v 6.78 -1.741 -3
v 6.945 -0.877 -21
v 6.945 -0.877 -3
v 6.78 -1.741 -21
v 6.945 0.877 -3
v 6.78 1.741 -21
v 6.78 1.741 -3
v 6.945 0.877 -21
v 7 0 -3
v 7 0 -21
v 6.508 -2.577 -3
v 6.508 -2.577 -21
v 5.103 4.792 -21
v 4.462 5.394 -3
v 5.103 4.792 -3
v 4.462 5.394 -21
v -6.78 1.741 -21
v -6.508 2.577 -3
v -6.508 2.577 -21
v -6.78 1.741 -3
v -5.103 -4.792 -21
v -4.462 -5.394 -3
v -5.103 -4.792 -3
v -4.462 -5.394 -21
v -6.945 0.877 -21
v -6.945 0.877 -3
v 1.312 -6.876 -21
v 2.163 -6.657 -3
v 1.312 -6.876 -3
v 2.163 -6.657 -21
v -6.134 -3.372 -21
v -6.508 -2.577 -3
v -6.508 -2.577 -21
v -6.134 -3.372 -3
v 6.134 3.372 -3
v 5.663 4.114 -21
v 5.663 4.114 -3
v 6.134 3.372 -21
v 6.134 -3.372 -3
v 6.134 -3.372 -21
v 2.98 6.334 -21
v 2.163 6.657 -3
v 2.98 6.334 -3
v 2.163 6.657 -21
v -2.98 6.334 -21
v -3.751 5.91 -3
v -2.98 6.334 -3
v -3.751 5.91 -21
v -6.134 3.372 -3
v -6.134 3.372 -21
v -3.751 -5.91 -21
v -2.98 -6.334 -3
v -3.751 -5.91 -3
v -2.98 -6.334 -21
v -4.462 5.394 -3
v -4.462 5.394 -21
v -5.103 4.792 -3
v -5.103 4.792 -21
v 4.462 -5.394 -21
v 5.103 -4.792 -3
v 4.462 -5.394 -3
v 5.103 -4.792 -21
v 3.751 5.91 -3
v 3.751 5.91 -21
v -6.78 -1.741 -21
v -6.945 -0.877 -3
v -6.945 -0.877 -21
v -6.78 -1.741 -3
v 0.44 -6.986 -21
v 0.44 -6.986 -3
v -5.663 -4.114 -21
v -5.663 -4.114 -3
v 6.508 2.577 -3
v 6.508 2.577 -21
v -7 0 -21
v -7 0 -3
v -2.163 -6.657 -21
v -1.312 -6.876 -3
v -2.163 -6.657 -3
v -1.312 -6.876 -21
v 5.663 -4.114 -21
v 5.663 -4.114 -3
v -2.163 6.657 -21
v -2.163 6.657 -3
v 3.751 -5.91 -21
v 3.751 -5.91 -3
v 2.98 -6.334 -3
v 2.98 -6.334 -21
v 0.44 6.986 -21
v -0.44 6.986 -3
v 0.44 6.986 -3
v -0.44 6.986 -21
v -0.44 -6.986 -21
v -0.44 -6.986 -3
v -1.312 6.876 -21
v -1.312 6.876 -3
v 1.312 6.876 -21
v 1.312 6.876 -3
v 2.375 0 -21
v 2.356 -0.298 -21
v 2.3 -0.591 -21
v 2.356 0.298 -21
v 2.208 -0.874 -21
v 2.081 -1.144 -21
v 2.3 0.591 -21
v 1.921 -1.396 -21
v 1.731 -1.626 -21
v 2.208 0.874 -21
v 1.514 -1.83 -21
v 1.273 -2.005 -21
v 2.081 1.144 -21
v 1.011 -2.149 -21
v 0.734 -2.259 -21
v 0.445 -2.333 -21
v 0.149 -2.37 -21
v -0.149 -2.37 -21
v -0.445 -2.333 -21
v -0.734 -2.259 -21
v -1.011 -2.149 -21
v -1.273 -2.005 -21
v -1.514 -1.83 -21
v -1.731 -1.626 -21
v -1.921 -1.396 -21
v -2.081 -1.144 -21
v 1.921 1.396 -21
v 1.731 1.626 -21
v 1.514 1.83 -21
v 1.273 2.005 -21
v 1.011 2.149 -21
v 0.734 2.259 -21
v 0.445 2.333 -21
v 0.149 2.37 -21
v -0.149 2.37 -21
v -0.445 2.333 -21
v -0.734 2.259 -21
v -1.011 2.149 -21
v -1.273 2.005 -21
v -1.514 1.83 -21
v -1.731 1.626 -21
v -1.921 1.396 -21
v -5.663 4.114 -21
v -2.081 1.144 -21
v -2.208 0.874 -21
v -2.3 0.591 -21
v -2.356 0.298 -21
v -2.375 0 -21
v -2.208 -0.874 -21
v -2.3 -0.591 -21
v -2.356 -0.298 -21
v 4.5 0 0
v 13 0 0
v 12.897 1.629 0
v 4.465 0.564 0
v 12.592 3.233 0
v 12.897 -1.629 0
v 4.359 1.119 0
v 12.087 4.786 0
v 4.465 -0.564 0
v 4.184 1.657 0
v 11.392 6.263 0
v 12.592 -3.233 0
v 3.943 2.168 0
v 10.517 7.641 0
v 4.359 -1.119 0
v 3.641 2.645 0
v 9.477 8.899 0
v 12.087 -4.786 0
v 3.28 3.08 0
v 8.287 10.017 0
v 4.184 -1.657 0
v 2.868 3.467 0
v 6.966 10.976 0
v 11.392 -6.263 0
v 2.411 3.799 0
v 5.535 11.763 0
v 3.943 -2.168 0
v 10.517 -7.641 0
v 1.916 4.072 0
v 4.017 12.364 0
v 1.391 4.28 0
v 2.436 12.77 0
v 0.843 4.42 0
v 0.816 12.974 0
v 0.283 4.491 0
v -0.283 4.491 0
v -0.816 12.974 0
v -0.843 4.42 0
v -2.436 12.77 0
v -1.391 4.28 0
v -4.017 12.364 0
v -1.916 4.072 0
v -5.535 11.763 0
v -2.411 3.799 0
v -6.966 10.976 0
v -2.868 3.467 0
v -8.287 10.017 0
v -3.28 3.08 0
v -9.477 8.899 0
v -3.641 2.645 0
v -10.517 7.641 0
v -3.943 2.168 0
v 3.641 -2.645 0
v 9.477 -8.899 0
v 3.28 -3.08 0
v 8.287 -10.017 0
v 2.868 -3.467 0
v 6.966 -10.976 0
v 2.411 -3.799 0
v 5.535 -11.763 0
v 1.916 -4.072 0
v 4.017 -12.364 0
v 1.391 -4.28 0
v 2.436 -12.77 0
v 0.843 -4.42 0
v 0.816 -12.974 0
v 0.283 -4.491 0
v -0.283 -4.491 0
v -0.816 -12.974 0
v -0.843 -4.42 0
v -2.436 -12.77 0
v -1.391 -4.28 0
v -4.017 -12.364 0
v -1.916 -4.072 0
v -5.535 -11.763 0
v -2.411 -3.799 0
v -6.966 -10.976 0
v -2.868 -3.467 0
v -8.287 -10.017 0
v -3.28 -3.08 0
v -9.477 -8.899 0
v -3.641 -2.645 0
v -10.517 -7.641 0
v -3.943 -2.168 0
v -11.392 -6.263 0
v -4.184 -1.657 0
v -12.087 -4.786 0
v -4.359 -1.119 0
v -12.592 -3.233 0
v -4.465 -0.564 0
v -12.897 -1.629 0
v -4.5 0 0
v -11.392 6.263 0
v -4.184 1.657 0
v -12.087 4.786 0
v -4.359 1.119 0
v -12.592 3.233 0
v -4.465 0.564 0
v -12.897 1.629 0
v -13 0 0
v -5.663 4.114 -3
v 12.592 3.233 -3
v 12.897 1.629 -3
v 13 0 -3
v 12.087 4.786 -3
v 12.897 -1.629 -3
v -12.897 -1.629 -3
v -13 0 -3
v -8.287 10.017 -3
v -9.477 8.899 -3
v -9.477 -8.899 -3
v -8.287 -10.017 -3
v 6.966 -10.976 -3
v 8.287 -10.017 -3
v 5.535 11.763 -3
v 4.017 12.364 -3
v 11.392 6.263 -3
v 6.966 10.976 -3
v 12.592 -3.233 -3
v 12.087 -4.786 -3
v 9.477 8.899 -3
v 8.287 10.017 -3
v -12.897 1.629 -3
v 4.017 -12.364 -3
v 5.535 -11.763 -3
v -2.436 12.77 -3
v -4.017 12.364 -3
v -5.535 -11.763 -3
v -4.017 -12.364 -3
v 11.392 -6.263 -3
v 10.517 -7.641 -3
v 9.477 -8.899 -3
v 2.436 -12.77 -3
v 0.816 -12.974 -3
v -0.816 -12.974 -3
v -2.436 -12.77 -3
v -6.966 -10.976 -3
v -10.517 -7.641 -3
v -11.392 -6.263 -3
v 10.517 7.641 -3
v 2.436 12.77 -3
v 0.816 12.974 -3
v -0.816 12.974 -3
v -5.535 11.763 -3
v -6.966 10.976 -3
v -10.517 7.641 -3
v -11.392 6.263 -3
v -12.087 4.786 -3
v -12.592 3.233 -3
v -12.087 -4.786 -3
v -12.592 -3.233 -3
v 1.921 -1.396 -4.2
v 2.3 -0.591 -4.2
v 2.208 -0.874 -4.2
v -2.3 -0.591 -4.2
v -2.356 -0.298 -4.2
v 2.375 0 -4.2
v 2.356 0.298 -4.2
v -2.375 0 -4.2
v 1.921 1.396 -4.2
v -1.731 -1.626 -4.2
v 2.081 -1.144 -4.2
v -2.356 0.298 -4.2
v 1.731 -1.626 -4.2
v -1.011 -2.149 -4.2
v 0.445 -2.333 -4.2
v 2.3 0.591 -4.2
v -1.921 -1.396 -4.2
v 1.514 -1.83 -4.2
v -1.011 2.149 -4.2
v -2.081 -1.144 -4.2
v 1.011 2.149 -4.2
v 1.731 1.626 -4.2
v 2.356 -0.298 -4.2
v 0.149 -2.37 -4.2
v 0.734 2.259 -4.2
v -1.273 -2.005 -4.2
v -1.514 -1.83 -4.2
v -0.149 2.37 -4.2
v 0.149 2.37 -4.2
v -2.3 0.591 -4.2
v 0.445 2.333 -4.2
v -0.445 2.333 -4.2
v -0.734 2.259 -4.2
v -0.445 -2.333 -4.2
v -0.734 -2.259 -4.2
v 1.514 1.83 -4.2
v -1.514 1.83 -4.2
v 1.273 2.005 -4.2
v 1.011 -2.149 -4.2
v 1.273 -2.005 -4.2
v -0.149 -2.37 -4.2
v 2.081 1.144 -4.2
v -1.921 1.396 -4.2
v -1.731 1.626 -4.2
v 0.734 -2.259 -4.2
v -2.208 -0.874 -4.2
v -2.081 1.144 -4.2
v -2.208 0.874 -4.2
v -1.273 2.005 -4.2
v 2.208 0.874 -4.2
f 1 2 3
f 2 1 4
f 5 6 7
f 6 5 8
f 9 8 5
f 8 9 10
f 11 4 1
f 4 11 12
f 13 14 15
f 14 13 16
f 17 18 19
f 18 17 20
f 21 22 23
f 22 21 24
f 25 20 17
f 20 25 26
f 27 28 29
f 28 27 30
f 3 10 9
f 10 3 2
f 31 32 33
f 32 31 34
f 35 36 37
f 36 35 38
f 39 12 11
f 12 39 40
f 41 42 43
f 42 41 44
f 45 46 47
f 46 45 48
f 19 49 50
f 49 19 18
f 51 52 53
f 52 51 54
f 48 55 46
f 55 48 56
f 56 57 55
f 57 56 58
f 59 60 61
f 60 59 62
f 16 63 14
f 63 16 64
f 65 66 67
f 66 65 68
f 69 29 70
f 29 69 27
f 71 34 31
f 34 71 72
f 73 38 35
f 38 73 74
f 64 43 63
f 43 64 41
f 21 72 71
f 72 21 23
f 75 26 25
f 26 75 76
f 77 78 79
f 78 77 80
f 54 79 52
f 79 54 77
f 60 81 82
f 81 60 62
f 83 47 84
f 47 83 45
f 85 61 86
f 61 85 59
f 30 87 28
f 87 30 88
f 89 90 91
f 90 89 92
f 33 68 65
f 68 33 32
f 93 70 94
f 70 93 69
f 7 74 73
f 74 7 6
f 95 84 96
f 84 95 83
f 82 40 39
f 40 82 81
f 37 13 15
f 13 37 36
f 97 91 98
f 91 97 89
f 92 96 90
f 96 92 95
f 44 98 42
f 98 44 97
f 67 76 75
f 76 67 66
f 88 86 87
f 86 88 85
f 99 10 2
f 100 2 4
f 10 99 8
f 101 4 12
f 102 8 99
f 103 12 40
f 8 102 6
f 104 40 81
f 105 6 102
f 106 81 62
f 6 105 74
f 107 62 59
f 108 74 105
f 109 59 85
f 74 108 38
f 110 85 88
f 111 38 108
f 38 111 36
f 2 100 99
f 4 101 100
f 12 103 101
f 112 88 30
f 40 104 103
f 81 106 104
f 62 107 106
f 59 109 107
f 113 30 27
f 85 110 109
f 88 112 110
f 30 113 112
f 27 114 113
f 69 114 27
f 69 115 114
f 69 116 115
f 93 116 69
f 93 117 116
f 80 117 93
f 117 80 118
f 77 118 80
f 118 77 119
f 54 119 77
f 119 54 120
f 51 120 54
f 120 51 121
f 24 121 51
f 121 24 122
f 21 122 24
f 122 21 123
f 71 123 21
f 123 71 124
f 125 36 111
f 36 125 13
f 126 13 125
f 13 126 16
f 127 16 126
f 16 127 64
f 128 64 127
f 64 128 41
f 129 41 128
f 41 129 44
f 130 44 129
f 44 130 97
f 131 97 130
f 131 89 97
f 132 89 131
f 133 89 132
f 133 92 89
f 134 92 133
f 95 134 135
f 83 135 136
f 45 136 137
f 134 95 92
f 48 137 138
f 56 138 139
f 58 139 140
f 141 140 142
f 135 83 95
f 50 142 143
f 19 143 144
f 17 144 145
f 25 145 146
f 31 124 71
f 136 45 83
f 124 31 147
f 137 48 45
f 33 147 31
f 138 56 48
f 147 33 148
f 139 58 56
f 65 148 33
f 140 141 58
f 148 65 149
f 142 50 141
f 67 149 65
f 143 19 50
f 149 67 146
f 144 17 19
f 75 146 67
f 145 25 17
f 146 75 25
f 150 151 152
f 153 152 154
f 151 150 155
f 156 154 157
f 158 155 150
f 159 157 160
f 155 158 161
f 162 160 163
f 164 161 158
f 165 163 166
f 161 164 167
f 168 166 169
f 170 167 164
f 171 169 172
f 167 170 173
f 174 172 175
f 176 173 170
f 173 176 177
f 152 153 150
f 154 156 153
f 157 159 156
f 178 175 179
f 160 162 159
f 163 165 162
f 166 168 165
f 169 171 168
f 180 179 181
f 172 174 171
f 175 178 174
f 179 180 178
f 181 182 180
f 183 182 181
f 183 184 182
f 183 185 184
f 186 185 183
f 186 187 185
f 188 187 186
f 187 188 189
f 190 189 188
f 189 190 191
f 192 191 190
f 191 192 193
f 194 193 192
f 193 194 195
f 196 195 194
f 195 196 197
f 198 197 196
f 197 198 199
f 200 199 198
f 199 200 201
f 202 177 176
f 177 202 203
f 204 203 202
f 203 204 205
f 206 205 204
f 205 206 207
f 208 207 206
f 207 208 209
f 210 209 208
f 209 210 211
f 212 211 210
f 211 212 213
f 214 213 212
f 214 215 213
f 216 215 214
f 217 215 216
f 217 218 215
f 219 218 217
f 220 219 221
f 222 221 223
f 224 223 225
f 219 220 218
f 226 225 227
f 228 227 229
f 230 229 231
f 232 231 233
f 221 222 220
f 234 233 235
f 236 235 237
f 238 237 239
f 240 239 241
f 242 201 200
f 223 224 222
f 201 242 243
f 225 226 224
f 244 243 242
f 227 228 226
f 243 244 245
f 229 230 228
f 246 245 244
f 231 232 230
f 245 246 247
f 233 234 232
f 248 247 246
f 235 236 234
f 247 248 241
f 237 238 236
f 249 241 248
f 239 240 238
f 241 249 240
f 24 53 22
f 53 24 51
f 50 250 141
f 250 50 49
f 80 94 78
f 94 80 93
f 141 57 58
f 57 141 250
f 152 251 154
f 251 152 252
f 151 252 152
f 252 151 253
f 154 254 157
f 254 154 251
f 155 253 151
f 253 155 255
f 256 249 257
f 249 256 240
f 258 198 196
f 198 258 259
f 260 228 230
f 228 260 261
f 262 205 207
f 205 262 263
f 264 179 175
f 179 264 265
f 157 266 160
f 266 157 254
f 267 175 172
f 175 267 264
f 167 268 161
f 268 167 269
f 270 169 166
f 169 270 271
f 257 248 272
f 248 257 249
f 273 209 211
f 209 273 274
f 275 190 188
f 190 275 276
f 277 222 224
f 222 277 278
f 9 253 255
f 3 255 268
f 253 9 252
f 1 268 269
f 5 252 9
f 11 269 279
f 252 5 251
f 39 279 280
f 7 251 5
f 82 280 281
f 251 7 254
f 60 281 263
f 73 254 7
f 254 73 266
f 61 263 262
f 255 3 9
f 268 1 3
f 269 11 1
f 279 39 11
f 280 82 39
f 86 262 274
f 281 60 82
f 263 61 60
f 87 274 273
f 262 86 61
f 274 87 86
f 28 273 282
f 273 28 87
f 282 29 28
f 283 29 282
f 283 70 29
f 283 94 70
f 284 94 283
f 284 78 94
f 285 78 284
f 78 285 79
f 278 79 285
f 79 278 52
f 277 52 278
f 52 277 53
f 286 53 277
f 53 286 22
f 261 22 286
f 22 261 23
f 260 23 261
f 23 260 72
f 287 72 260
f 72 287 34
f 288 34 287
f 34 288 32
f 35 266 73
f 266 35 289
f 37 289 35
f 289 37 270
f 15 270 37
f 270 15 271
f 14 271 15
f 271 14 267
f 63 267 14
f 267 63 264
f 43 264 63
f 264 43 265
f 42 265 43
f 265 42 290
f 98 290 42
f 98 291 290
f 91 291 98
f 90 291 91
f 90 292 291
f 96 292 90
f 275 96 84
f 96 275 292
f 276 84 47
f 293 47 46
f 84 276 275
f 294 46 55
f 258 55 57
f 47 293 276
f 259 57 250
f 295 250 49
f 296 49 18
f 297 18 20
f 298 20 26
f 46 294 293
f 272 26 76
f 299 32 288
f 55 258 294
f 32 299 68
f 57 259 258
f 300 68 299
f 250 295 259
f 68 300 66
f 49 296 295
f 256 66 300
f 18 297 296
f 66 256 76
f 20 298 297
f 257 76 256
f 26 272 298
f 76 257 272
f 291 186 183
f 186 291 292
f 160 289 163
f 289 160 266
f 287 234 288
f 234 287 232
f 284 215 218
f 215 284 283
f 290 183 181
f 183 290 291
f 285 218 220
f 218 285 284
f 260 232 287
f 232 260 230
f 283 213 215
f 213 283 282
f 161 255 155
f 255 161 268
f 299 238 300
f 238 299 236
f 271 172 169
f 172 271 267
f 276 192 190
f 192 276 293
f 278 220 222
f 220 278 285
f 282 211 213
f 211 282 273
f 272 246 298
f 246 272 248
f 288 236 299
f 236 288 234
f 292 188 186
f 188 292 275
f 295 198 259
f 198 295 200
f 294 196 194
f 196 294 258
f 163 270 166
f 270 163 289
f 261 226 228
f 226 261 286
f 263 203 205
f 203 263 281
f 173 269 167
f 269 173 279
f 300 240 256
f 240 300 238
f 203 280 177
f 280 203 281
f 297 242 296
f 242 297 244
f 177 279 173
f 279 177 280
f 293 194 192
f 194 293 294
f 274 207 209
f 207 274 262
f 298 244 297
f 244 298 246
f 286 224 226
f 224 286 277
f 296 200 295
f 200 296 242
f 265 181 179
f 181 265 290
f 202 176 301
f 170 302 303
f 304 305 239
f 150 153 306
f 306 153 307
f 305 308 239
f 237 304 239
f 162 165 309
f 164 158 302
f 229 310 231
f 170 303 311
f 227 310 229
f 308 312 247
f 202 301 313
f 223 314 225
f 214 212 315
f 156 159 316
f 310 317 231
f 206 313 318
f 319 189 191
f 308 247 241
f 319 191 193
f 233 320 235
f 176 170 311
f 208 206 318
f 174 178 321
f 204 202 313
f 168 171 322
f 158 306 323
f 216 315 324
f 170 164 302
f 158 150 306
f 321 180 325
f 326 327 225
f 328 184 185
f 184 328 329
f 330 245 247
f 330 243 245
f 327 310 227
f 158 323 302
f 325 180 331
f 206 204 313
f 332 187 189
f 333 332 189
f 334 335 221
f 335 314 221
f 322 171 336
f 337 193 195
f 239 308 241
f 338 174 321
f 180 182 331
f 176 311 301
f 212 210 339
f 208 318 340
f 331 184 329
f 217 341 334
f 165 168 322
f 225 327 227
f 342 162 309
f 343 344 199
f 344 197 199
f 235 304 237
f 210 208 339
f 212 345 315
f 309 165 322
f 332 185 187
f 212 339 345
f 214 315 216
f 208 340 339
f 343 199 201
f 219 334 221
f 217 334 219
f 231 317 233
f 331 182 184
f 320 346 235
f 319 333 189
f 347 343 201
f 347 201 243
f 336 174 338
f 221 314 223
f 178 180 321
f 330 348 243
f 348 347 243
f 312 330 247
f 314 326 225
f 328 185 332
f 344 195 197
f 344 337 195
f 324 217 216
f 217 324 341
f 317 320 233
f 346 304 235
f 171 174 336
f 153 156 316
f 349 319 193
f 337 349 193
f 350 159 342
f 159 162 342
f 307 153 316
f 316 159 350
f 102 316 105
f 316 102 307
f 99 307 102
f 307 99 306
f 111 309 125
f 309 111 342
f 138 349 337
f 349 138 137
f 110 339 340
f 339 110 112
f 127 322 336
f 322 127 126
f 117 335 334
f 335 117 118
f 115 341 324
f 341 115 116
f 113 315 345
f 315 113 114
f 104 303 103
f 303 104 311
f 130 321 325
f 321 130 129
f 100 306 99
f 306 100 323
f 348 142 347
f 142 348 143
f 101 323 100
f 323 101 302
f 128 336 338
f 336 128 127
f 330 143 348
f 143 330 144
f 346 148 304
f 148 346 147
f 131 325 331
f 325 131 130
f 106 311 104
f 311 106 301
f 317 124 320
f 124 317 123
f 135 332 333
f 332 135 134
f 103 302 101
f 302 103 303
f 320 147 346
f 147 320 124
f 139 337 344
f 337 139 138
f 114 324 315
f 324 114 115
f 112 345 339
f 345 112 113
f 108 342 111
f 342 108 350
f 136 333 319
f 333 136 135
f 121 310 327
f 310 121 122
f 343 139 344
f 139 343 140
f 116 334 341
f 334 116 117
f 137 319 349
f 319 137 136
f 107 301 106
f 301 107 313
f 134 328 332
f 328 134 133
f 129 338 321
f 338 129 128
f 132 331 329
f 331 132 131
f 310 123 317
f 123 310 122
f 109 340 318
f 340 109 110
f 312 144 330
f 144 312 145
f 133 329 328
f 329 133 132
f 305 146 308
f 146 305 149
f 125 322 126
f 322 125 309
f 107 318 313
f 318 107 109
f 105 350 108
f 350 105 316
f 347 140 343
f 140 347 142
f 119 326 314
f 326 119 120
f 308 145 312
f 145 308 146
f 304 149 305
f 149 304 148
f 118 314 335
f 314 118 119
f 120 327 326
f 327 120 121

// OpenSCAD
$fn = 50;


difference() {
	union() {
		translate(v = [0, 0, -21.0000000000]) {
			cylinder(h = 21, r = 7.0000000000);
		}
		translate(v = [0, 0, -3.0000000000]) {
			cylinder(h = 3, r = 13.0000000000);
		}
	}
	union() {
		translate(v = [0, 0, 0]) {
			rotate(a = [0, 0, 0]) {
				difference() {
					union() {
						#translate(v = [0, 0, -21.0000000000]) {
							cylinder(h = 21, r = 2.2500000000);
						}
						#translate(v = [0, 0, -4.2000000000]) {
							cylinder(h = 4.2000000000, r1 = 2.3750000000, r2 = 4.5000000000);
						}
						#translate(v = [0, 0, -21.0000000000]) {
							cylinder(h = 21, r = 2.3750000000);
						}
						#translate(v = [0, 0, -21.0000000000]) {
							cylinder(h = 21, r = 2.2500000000);
						}
					}
					union();
				}
			}
		}
	}
}
